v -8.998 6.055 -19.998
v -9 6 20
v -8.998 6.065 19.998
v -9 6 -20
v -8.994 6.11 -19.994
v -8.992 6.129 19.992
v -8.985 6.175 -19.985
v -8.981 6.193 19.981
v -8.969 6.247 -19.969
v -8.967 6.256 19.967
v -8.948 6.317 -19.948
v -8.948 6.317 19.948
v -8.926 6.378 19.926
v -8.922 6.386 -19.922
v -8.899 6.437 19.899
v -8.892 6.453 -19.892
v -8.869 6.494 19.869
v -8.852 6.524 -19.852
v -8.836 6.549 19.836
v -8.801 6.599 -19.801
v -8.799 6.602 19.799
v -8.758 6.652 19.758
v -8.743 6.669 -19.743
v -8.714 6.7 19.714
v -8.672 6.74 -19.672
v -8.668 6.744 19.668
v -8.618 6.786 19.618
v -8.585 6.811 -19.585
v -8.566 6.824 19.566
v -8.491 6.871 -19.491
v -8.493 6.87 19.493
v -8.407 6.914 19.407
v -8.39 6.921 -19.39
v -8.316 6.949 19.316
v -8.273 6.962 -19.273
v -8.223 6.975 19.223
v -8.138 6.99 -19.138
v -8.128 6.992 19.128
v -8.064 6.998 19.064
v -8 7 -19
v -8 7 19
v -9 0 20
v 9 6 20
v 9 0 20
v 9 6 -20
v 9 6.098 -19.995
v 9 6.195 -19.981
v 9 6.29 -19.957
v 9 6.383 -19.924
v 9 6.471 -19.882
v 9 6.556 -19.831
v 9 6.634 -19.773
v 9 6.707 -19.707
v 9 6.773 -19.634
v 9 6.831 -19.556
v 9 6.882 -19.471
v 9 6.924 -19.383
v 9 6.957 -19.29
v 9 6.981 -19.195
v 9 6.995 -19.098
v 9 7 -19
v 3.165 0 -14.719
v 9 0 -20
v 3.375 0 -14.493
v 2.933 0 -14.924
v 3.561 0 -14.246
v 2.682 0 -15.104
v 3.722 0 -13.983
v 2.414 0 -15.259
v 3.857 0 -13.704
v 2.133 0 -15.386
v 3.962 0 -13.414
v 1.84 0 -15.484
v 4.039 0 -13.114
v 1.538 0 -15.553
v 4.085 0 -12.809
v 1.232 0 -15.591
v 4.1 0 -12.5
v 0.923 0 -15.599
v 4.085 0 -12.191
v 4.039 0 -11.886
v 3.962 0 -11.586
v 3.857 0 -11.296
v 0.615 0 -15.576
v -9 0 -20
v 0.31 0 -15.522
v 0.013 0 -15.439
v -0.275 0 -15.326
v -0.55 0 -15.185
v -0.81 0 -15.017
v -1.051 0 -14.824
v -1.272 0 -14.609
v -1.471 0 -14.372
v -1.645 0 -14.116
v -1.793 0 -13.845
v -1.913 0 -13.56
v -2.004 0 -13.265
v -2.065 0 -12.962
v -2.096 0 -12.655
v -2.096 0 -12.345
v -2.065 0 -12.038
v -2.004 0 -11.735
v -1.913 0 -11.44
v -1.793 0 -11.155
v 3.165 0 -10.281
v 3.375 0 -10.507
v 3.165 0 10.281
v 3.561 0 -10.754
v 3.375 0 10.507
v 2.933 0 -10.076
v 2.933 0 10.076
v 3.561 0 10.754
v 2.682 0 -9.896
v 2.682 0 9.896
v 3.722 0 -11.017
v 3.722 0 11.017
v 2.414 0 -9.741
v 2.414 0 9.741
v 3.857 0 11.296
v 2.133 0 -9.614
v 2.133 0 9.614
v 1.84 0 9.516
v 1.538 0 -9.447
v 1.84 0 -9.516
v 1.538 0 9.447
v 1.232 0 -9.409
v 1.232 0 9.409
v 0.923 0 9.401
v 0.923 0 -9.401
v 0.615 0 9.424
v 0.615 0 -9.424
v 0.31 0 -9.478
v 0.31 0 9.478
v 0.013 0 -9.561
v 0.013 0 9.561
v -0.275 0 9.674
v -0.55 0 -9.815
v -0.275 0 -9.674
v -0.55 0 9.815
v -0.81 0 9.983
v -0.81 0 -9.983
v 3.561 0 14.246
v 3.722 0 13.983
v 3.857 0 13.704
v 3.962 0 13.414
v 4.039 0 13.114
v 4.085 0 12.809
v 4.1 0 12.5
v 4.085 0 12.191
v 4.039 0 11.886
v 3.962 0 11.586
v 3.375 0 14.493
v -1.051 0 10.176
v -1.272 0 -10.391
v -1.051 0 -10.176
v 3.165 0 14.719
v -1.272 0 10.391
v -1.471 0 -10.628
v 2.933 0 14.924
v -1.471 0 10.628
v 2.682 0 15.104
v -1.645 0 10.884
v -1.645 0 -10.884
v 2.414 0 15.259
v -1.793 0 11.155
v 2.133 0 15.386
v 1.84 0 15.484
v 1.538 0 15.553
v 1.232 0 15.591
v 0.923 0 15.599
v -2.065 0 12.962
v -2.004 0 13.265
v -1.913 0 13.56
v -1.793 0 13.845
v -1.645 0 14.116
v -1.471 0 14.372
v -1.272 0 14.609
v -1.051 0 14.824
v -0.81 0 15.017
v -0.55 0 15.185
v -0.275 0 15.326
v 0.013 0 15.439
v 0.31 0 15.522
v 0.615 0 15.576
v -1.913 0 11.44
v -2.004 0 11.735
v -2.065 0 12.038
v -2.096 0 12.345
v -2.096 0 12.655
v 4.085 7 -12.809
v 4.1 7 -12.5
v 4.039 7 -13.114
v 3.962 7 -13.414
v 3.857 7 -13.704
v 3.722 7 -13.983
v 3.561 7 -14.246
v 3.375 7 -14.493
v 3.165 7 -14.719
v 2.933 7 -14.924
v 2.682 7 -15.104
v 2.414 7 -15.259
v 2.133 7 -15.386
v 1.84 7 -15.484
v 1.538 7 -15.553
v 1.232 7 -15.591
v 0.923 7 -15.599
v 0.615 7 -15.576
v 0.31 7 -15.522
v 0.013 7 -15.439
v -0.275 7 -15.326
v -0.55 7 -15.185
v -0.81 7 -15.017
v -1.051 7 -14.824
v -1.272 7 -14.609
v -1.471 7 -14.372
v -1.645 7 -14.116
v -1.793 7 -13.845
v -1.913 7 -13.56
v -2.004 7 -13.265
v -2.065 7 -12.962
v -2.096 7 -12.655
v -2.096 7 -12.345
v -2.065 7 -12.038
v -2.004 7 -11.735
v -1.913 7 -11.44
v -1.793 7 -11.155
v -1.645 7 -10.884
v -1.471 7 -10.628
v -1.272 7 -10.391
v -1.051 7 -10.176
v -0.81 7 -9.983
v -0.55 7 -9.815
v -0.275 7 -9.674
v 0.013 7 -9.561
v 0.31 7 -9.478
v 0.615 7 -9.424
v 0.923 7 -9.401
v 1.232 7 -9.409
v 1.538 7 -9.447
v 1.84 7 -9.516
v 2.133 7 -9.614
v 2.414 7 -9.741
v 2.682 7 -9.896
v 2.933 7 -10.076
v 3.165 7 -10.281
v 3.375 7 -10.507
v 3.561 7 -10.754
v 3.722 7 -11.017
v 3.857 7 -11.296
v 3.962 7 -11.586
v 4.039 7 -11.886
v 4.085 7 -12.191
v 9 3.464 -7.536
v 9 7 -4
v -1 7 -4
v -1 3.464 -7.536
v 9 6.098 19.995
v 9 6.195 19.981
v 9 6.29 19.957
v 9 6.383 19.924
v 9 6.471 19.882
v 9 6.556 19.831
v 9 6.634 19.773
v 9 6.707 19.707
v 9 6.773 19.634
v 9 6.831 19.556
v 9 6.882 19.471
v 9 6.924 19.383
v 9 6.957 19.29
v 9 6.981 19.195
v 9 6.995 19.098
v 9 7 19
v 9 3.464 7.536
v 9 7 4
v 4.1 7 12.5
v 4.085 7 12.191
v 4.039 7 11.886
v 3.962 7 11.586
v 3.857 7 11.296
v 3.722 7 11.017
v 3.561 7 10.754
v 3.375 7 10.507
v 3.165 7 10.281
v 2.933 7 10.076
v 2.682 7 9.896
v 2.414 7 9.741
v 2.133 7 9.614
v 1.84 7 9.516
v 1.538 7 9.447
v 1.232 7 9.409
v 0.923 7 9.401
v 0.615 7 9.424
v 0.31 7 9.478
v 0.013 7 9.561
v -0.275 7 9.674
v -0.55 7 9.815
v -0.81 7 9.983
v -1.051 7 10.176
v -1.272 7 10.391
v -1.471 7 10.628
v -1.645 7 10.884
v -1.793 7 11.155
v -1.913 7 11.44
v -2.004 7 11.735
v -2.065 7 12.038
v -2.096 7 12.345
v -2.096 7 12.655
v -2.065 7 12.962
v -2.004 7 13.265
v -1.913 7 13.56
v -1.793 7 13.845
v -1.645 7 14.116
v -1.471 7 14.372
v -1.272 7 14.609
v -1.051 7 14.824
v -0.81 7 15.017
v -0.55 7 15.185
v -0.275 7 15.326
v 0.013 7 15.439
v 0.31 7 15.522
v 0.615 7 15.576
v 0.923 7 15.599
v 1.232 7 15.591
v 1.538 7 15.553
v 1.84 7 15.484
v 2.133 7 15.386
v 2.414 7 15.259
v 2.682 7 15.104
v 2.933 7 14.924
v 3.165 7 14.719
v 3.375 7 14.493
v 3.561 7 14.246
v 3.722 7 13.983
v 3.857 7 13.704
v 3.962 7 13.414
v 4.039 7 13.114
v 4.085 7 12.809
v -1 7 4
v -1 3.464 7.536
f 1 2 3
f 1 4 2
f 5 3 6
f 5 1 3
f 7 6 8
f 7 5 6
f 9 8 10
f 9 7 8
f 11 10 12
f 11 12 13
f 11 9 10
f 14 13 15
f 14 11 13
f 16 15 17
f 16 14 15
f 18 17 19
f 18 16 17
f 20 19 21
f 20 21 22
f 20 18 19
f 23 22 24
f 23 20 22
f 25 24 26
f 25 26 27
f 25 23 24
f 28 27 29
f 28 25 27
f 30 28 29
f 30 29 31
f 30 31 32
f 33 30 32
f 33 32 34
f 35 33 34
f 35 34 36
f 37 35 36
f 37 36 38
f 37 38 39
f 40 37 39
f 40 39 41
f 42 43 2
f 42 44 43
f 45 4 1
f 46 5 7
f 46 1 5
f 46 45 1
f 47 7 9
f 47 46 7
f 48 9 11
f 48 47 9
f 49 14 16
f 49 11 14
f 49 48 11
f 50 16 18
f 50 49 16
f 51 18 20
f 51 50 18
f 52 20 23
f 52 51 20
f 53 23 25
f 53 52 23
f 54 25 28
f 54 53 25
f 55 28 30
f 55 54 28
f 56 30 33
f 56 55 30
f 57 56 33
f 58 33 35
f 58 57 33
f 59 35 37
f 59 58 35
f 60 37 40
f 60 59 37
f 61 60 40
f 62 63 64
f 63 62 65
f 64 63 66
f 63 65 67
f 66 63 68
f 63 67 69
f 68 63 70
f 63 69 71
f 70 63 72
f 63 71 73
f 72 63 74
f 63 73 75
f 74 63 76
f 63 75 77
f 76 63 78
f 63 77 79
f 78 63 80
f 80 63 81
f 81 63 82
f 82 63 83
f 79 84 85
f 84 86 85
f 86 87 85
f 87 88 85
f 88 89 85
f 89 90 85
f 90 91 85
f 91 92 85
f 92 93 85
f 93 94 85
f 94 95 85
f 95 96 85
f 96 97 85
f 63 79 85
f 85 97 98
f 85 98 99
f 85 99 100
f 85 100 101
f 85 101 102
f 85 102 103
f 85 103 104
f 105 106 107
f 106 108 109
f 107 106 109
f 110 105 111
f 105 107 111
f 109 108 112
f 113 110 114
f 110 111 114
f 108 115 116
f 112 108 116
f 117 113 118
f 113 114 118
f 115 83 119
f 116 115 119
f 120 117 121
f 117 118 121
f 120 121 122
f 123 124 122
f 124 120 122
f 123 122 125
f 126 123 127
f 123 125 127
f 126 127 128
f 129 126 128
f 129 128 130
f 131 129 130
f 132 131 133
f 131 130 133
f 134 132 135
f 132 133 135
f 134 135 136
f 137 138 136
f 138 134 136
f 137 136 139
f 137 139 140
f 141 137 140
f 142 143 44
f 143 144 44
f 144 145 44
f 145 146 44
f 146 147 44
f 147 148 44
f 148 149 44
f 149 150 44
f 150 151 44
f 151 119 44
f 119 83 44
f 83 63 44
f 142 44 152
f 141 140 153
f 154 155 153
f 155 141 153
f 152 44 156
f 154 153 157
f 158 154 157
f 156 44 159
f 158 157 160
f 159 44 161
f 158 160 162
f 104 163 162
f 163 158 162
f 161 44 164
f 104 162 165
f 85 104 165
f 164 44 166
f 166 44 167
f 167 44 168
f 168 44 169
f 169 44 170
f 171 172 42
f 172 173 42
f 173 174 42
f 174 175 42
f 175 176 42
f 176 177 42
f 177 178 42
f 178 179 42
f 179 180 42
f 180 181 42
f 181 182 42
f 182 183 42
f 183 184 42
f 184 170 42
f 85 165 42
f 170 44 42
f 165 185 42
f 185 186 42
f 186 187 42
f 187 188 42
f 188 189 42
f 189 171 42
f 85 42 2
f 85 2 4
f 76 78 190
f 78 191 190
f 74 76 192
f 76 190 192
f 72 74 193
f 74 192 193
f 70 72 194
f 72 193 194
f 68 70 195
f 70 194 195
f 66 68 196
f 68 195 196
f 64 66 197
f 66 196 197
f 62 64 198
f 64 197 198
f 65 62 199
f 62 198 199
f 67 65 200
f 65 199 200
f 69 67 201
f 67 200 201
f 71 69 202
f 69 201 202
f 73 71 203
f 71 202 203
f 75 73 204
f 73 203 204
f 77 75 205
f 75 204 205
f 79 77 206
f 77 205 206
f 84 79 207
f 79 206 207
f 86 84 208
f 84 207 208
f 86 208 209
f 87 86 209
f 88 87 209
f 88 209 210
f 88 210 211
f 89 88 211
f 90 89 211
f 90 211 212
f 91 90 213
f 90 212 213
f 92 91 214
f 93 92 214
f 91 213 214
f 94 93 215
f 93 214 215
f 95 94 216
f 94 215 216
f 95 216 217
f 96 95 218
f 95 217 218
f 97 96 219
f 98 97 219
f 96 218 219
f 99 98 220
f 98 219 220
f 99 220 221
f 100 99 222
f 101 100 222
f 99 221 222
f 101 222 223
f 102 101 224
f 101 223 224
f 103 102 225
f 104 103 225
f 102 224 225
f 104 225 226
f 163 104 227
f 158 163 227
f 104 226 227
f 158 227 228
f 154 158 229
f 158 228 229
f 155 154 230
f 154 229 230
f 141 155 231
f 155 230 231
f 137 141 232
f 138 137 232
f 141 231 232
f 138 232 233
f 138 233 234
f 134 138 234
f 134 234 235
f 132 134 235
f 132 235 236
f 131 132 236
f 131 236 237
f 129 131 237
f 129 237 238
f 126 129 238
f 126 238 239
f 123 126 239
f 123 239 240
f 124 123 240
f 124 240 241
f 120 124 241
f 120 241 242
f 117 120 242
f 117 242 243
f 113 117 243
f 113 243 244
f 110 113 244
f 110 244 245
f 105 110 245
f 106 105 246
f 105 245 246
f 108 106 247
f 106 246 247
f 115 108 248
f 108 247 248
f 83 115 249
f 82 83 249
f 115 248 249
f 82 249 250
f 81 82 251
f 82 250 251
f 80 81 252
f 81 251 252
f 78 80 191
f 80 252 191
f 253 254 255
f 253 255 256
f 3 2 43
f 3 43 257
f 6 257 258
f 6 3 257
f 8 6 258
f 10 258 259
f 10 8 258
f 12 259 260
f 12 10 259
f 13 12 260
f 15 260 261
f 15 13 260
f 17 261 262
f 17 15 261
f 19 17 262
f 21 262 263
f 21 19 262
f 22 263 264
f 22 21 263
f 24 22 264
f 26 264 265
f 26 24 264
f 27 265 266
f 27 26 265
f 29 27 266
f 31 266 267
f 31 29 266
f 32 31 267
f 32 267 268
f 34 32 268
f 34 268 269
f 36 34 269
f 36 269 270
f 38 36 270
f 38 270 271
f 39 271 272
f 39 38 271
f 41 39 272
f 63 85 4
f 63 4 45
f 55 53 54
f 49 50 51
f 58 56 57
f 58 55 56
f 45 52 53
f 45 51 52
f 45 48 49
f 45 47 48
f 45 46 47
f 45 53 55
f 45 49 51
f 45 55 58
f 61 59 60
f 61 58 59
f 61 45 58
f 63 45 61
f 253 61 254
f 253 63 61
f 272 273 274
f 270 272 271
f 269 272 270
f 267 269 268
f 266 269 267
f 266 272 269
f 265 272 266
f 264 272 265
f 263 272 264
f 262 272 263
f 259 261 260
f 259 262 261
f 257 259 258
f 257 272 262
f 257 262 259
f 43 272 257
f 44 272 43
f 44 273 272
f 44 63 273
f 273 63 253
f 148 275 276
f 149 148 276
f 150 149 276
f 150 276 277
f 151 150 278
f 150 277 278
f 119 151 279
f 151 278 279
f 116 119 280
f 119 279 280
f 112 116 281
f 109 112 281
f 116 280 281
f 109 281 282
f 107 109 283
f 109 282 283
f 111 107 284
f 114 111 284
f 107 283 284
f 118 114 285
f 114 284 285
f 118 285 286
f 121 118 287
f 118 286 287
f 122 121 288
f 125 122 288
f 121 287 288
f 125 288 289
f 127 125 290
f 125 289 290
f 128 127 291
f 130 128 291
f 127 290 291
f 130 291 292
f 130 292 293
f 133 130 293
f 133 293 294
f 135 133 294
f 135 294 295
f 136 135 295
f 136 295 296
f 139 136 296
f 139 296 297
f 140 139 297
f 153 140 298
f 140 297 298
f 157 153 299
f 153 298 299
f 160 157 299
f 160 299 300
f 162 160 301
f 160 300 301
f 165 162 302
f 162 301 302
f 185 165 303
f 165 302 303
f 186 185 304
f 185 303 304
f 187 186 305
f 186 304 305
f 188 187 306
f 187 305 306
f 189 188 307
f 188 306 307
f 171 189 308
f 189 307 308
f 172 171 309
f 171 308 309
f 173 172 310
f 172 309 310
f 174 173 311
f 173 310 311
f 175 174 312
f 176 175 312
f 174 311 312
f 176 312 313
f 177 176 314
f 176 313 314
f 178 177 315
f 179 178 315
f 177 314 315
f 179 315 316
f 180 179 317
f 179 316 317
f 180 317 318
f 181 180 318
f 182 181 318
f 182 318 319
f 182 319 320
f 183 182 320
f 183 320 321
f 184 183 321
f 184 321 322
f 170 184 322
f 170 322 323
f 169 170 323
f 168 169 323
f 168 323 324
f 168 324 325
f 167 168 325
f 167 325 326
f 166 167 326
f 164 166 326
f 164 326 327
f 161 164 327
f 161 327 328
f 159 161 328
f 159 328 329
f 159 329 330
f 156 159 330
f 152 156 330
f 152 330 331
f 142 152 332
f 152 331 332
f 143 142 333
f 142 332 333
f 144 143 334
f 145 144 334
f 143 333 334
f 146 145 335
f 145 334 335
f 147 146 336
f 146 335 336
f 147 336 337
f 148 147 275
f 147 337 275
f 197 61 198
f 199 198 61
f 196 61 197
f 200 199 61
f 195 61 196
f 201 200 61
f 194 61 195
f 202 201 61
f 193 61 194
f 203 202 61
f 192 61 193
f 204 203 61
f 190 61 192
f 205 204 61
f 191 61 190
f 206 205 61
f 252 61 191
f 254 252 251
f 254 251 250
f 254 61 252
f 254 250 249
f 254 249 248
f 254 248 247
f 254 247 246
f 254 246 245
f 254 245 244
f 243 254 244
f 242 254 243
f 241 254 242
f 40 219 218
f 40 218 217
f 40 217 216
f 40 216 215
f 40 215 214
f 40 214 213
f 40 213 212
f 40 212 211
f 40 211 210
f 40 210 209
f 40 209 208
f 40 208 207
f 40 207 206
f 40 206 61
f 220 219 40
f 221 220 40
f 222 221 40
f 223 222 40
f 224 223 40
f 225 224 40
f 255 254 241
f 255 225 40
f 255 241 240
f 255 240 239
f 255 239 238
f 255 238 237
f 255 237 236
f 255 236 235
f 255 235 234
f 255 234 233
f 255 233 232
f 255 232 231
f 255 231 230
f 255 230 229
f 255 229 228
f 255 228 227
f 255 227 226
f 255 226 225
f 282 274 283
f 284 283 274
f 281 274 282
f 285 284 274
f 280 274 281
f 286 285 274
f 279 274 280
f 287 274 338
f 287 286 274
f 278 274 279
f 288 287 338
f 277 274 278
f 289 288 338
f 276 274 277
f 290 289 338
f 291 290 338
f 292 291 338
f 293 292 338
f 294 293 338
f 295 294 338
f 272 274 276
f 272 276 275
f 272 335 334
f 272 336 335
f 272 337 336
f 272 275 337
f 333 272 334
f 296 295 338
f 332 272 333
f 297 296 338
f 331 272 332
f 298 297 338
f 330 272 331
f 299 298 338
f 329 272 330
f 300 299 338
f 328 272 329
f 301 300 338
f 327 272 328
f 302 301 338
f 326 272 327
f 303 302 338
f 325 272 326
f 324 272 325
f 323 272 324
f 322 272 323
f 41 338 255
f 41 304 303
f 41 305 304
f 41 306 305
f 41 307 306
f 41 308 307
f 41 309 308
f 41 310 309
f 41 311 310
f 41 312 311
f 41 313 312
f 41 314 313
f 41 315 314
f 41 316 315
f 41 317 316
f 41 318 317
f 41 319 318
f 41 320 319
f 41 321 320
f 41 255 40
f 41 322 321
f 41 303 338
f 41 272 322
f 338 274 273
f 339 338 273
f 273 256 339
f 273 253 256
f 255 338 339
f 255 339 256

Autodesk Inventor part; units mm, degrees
ref_plane "YZ Plane" through (0, 0, 0) normal (1, 0, 0) x (0, 1, 0)
ref_plane "XZ Plane" through (0, 0, 0) normal (0, 1, 0) x (-1, 0, 0)
ref_plane "XY Plane" through (0, 0, 0) normal (0, 0, 1) x (1, 0, 0)
sketch "Sketch1" plane through (0, 0, 0) normal (0, 1, 0) x (-1, 0, 0)
  line L0 (-9, 20) -> (9, 20)
  line L1 (9, 20) -> (9, -20)
  line L2 (9, -20) -> (-9, -20)
  line L3 (-9, -20) -> (-9, 20)
  line L4 (-9, 20) -> (9, -20) construction
  line L5 (9, 20) -> (-9, -20) construction
  point P0 (0, 0)
  dimension "d0" = 18
  dimension "d1" = 40
extrude "Extrusion1" add sketch "Sketch1" along normal blind 7
sketch "Sketch2" plane through (0, 7, 0) normal (0, 1, 0) x (1, 0, 0)
  circle A0 centre (1, -12.5) radius 3.1
  line L0 (-9, -20) -> (9, -20) projected
  line L1 (9, -20) -> (9, 20) projected
  point P0 (0, 0)
  dimension "d4" = 6.2
  dimension "d5" = 7.5
  dimension "d6" = 8
extrude "Extrusion2" cut sketch "Sketch2" against normal through all
mirror "Mirror1" about plane through (0, 0, 0) normal (0, 0, 1) of "Extrusion2"
sketch "Sketch3" plane through (9, 0, 20) normal (1, 0, 0) x (0, 0, -1)
  line L0 (0, 7) -> (40, 7) projected
  line L1 (16, 7) -> (12.4645, 3.4645)
  line L2 (16, 7) -> (21, 7) construction
  line L3 (16, 7) -> (24, 7)
  line L4 (16, 7) -> (24, 7) construction
  line L5 (24, 7) -> (27.5355, 3.4645)
  line L6 (27.5355, 3.4645) -> (12.4645, 3.4645)
  point P0 (20, 0)
  dimension "d9" = 5
  dimension "d10" = 135
  dimension "d11" = 16
  dimension "d12" = 8
  dimension "d13" = 0
  dimension "d14" = 5
  dimension "d15" = 135
extrude "Extrusion3" cut sketch "Sketch3" against normal blind 10
fillet "Fillet1" radius 1 3 edges at (0, 7, -20) (-9, 7, 0) (0, 7, 20)
properties part number "Dovetail_holder_V2"
